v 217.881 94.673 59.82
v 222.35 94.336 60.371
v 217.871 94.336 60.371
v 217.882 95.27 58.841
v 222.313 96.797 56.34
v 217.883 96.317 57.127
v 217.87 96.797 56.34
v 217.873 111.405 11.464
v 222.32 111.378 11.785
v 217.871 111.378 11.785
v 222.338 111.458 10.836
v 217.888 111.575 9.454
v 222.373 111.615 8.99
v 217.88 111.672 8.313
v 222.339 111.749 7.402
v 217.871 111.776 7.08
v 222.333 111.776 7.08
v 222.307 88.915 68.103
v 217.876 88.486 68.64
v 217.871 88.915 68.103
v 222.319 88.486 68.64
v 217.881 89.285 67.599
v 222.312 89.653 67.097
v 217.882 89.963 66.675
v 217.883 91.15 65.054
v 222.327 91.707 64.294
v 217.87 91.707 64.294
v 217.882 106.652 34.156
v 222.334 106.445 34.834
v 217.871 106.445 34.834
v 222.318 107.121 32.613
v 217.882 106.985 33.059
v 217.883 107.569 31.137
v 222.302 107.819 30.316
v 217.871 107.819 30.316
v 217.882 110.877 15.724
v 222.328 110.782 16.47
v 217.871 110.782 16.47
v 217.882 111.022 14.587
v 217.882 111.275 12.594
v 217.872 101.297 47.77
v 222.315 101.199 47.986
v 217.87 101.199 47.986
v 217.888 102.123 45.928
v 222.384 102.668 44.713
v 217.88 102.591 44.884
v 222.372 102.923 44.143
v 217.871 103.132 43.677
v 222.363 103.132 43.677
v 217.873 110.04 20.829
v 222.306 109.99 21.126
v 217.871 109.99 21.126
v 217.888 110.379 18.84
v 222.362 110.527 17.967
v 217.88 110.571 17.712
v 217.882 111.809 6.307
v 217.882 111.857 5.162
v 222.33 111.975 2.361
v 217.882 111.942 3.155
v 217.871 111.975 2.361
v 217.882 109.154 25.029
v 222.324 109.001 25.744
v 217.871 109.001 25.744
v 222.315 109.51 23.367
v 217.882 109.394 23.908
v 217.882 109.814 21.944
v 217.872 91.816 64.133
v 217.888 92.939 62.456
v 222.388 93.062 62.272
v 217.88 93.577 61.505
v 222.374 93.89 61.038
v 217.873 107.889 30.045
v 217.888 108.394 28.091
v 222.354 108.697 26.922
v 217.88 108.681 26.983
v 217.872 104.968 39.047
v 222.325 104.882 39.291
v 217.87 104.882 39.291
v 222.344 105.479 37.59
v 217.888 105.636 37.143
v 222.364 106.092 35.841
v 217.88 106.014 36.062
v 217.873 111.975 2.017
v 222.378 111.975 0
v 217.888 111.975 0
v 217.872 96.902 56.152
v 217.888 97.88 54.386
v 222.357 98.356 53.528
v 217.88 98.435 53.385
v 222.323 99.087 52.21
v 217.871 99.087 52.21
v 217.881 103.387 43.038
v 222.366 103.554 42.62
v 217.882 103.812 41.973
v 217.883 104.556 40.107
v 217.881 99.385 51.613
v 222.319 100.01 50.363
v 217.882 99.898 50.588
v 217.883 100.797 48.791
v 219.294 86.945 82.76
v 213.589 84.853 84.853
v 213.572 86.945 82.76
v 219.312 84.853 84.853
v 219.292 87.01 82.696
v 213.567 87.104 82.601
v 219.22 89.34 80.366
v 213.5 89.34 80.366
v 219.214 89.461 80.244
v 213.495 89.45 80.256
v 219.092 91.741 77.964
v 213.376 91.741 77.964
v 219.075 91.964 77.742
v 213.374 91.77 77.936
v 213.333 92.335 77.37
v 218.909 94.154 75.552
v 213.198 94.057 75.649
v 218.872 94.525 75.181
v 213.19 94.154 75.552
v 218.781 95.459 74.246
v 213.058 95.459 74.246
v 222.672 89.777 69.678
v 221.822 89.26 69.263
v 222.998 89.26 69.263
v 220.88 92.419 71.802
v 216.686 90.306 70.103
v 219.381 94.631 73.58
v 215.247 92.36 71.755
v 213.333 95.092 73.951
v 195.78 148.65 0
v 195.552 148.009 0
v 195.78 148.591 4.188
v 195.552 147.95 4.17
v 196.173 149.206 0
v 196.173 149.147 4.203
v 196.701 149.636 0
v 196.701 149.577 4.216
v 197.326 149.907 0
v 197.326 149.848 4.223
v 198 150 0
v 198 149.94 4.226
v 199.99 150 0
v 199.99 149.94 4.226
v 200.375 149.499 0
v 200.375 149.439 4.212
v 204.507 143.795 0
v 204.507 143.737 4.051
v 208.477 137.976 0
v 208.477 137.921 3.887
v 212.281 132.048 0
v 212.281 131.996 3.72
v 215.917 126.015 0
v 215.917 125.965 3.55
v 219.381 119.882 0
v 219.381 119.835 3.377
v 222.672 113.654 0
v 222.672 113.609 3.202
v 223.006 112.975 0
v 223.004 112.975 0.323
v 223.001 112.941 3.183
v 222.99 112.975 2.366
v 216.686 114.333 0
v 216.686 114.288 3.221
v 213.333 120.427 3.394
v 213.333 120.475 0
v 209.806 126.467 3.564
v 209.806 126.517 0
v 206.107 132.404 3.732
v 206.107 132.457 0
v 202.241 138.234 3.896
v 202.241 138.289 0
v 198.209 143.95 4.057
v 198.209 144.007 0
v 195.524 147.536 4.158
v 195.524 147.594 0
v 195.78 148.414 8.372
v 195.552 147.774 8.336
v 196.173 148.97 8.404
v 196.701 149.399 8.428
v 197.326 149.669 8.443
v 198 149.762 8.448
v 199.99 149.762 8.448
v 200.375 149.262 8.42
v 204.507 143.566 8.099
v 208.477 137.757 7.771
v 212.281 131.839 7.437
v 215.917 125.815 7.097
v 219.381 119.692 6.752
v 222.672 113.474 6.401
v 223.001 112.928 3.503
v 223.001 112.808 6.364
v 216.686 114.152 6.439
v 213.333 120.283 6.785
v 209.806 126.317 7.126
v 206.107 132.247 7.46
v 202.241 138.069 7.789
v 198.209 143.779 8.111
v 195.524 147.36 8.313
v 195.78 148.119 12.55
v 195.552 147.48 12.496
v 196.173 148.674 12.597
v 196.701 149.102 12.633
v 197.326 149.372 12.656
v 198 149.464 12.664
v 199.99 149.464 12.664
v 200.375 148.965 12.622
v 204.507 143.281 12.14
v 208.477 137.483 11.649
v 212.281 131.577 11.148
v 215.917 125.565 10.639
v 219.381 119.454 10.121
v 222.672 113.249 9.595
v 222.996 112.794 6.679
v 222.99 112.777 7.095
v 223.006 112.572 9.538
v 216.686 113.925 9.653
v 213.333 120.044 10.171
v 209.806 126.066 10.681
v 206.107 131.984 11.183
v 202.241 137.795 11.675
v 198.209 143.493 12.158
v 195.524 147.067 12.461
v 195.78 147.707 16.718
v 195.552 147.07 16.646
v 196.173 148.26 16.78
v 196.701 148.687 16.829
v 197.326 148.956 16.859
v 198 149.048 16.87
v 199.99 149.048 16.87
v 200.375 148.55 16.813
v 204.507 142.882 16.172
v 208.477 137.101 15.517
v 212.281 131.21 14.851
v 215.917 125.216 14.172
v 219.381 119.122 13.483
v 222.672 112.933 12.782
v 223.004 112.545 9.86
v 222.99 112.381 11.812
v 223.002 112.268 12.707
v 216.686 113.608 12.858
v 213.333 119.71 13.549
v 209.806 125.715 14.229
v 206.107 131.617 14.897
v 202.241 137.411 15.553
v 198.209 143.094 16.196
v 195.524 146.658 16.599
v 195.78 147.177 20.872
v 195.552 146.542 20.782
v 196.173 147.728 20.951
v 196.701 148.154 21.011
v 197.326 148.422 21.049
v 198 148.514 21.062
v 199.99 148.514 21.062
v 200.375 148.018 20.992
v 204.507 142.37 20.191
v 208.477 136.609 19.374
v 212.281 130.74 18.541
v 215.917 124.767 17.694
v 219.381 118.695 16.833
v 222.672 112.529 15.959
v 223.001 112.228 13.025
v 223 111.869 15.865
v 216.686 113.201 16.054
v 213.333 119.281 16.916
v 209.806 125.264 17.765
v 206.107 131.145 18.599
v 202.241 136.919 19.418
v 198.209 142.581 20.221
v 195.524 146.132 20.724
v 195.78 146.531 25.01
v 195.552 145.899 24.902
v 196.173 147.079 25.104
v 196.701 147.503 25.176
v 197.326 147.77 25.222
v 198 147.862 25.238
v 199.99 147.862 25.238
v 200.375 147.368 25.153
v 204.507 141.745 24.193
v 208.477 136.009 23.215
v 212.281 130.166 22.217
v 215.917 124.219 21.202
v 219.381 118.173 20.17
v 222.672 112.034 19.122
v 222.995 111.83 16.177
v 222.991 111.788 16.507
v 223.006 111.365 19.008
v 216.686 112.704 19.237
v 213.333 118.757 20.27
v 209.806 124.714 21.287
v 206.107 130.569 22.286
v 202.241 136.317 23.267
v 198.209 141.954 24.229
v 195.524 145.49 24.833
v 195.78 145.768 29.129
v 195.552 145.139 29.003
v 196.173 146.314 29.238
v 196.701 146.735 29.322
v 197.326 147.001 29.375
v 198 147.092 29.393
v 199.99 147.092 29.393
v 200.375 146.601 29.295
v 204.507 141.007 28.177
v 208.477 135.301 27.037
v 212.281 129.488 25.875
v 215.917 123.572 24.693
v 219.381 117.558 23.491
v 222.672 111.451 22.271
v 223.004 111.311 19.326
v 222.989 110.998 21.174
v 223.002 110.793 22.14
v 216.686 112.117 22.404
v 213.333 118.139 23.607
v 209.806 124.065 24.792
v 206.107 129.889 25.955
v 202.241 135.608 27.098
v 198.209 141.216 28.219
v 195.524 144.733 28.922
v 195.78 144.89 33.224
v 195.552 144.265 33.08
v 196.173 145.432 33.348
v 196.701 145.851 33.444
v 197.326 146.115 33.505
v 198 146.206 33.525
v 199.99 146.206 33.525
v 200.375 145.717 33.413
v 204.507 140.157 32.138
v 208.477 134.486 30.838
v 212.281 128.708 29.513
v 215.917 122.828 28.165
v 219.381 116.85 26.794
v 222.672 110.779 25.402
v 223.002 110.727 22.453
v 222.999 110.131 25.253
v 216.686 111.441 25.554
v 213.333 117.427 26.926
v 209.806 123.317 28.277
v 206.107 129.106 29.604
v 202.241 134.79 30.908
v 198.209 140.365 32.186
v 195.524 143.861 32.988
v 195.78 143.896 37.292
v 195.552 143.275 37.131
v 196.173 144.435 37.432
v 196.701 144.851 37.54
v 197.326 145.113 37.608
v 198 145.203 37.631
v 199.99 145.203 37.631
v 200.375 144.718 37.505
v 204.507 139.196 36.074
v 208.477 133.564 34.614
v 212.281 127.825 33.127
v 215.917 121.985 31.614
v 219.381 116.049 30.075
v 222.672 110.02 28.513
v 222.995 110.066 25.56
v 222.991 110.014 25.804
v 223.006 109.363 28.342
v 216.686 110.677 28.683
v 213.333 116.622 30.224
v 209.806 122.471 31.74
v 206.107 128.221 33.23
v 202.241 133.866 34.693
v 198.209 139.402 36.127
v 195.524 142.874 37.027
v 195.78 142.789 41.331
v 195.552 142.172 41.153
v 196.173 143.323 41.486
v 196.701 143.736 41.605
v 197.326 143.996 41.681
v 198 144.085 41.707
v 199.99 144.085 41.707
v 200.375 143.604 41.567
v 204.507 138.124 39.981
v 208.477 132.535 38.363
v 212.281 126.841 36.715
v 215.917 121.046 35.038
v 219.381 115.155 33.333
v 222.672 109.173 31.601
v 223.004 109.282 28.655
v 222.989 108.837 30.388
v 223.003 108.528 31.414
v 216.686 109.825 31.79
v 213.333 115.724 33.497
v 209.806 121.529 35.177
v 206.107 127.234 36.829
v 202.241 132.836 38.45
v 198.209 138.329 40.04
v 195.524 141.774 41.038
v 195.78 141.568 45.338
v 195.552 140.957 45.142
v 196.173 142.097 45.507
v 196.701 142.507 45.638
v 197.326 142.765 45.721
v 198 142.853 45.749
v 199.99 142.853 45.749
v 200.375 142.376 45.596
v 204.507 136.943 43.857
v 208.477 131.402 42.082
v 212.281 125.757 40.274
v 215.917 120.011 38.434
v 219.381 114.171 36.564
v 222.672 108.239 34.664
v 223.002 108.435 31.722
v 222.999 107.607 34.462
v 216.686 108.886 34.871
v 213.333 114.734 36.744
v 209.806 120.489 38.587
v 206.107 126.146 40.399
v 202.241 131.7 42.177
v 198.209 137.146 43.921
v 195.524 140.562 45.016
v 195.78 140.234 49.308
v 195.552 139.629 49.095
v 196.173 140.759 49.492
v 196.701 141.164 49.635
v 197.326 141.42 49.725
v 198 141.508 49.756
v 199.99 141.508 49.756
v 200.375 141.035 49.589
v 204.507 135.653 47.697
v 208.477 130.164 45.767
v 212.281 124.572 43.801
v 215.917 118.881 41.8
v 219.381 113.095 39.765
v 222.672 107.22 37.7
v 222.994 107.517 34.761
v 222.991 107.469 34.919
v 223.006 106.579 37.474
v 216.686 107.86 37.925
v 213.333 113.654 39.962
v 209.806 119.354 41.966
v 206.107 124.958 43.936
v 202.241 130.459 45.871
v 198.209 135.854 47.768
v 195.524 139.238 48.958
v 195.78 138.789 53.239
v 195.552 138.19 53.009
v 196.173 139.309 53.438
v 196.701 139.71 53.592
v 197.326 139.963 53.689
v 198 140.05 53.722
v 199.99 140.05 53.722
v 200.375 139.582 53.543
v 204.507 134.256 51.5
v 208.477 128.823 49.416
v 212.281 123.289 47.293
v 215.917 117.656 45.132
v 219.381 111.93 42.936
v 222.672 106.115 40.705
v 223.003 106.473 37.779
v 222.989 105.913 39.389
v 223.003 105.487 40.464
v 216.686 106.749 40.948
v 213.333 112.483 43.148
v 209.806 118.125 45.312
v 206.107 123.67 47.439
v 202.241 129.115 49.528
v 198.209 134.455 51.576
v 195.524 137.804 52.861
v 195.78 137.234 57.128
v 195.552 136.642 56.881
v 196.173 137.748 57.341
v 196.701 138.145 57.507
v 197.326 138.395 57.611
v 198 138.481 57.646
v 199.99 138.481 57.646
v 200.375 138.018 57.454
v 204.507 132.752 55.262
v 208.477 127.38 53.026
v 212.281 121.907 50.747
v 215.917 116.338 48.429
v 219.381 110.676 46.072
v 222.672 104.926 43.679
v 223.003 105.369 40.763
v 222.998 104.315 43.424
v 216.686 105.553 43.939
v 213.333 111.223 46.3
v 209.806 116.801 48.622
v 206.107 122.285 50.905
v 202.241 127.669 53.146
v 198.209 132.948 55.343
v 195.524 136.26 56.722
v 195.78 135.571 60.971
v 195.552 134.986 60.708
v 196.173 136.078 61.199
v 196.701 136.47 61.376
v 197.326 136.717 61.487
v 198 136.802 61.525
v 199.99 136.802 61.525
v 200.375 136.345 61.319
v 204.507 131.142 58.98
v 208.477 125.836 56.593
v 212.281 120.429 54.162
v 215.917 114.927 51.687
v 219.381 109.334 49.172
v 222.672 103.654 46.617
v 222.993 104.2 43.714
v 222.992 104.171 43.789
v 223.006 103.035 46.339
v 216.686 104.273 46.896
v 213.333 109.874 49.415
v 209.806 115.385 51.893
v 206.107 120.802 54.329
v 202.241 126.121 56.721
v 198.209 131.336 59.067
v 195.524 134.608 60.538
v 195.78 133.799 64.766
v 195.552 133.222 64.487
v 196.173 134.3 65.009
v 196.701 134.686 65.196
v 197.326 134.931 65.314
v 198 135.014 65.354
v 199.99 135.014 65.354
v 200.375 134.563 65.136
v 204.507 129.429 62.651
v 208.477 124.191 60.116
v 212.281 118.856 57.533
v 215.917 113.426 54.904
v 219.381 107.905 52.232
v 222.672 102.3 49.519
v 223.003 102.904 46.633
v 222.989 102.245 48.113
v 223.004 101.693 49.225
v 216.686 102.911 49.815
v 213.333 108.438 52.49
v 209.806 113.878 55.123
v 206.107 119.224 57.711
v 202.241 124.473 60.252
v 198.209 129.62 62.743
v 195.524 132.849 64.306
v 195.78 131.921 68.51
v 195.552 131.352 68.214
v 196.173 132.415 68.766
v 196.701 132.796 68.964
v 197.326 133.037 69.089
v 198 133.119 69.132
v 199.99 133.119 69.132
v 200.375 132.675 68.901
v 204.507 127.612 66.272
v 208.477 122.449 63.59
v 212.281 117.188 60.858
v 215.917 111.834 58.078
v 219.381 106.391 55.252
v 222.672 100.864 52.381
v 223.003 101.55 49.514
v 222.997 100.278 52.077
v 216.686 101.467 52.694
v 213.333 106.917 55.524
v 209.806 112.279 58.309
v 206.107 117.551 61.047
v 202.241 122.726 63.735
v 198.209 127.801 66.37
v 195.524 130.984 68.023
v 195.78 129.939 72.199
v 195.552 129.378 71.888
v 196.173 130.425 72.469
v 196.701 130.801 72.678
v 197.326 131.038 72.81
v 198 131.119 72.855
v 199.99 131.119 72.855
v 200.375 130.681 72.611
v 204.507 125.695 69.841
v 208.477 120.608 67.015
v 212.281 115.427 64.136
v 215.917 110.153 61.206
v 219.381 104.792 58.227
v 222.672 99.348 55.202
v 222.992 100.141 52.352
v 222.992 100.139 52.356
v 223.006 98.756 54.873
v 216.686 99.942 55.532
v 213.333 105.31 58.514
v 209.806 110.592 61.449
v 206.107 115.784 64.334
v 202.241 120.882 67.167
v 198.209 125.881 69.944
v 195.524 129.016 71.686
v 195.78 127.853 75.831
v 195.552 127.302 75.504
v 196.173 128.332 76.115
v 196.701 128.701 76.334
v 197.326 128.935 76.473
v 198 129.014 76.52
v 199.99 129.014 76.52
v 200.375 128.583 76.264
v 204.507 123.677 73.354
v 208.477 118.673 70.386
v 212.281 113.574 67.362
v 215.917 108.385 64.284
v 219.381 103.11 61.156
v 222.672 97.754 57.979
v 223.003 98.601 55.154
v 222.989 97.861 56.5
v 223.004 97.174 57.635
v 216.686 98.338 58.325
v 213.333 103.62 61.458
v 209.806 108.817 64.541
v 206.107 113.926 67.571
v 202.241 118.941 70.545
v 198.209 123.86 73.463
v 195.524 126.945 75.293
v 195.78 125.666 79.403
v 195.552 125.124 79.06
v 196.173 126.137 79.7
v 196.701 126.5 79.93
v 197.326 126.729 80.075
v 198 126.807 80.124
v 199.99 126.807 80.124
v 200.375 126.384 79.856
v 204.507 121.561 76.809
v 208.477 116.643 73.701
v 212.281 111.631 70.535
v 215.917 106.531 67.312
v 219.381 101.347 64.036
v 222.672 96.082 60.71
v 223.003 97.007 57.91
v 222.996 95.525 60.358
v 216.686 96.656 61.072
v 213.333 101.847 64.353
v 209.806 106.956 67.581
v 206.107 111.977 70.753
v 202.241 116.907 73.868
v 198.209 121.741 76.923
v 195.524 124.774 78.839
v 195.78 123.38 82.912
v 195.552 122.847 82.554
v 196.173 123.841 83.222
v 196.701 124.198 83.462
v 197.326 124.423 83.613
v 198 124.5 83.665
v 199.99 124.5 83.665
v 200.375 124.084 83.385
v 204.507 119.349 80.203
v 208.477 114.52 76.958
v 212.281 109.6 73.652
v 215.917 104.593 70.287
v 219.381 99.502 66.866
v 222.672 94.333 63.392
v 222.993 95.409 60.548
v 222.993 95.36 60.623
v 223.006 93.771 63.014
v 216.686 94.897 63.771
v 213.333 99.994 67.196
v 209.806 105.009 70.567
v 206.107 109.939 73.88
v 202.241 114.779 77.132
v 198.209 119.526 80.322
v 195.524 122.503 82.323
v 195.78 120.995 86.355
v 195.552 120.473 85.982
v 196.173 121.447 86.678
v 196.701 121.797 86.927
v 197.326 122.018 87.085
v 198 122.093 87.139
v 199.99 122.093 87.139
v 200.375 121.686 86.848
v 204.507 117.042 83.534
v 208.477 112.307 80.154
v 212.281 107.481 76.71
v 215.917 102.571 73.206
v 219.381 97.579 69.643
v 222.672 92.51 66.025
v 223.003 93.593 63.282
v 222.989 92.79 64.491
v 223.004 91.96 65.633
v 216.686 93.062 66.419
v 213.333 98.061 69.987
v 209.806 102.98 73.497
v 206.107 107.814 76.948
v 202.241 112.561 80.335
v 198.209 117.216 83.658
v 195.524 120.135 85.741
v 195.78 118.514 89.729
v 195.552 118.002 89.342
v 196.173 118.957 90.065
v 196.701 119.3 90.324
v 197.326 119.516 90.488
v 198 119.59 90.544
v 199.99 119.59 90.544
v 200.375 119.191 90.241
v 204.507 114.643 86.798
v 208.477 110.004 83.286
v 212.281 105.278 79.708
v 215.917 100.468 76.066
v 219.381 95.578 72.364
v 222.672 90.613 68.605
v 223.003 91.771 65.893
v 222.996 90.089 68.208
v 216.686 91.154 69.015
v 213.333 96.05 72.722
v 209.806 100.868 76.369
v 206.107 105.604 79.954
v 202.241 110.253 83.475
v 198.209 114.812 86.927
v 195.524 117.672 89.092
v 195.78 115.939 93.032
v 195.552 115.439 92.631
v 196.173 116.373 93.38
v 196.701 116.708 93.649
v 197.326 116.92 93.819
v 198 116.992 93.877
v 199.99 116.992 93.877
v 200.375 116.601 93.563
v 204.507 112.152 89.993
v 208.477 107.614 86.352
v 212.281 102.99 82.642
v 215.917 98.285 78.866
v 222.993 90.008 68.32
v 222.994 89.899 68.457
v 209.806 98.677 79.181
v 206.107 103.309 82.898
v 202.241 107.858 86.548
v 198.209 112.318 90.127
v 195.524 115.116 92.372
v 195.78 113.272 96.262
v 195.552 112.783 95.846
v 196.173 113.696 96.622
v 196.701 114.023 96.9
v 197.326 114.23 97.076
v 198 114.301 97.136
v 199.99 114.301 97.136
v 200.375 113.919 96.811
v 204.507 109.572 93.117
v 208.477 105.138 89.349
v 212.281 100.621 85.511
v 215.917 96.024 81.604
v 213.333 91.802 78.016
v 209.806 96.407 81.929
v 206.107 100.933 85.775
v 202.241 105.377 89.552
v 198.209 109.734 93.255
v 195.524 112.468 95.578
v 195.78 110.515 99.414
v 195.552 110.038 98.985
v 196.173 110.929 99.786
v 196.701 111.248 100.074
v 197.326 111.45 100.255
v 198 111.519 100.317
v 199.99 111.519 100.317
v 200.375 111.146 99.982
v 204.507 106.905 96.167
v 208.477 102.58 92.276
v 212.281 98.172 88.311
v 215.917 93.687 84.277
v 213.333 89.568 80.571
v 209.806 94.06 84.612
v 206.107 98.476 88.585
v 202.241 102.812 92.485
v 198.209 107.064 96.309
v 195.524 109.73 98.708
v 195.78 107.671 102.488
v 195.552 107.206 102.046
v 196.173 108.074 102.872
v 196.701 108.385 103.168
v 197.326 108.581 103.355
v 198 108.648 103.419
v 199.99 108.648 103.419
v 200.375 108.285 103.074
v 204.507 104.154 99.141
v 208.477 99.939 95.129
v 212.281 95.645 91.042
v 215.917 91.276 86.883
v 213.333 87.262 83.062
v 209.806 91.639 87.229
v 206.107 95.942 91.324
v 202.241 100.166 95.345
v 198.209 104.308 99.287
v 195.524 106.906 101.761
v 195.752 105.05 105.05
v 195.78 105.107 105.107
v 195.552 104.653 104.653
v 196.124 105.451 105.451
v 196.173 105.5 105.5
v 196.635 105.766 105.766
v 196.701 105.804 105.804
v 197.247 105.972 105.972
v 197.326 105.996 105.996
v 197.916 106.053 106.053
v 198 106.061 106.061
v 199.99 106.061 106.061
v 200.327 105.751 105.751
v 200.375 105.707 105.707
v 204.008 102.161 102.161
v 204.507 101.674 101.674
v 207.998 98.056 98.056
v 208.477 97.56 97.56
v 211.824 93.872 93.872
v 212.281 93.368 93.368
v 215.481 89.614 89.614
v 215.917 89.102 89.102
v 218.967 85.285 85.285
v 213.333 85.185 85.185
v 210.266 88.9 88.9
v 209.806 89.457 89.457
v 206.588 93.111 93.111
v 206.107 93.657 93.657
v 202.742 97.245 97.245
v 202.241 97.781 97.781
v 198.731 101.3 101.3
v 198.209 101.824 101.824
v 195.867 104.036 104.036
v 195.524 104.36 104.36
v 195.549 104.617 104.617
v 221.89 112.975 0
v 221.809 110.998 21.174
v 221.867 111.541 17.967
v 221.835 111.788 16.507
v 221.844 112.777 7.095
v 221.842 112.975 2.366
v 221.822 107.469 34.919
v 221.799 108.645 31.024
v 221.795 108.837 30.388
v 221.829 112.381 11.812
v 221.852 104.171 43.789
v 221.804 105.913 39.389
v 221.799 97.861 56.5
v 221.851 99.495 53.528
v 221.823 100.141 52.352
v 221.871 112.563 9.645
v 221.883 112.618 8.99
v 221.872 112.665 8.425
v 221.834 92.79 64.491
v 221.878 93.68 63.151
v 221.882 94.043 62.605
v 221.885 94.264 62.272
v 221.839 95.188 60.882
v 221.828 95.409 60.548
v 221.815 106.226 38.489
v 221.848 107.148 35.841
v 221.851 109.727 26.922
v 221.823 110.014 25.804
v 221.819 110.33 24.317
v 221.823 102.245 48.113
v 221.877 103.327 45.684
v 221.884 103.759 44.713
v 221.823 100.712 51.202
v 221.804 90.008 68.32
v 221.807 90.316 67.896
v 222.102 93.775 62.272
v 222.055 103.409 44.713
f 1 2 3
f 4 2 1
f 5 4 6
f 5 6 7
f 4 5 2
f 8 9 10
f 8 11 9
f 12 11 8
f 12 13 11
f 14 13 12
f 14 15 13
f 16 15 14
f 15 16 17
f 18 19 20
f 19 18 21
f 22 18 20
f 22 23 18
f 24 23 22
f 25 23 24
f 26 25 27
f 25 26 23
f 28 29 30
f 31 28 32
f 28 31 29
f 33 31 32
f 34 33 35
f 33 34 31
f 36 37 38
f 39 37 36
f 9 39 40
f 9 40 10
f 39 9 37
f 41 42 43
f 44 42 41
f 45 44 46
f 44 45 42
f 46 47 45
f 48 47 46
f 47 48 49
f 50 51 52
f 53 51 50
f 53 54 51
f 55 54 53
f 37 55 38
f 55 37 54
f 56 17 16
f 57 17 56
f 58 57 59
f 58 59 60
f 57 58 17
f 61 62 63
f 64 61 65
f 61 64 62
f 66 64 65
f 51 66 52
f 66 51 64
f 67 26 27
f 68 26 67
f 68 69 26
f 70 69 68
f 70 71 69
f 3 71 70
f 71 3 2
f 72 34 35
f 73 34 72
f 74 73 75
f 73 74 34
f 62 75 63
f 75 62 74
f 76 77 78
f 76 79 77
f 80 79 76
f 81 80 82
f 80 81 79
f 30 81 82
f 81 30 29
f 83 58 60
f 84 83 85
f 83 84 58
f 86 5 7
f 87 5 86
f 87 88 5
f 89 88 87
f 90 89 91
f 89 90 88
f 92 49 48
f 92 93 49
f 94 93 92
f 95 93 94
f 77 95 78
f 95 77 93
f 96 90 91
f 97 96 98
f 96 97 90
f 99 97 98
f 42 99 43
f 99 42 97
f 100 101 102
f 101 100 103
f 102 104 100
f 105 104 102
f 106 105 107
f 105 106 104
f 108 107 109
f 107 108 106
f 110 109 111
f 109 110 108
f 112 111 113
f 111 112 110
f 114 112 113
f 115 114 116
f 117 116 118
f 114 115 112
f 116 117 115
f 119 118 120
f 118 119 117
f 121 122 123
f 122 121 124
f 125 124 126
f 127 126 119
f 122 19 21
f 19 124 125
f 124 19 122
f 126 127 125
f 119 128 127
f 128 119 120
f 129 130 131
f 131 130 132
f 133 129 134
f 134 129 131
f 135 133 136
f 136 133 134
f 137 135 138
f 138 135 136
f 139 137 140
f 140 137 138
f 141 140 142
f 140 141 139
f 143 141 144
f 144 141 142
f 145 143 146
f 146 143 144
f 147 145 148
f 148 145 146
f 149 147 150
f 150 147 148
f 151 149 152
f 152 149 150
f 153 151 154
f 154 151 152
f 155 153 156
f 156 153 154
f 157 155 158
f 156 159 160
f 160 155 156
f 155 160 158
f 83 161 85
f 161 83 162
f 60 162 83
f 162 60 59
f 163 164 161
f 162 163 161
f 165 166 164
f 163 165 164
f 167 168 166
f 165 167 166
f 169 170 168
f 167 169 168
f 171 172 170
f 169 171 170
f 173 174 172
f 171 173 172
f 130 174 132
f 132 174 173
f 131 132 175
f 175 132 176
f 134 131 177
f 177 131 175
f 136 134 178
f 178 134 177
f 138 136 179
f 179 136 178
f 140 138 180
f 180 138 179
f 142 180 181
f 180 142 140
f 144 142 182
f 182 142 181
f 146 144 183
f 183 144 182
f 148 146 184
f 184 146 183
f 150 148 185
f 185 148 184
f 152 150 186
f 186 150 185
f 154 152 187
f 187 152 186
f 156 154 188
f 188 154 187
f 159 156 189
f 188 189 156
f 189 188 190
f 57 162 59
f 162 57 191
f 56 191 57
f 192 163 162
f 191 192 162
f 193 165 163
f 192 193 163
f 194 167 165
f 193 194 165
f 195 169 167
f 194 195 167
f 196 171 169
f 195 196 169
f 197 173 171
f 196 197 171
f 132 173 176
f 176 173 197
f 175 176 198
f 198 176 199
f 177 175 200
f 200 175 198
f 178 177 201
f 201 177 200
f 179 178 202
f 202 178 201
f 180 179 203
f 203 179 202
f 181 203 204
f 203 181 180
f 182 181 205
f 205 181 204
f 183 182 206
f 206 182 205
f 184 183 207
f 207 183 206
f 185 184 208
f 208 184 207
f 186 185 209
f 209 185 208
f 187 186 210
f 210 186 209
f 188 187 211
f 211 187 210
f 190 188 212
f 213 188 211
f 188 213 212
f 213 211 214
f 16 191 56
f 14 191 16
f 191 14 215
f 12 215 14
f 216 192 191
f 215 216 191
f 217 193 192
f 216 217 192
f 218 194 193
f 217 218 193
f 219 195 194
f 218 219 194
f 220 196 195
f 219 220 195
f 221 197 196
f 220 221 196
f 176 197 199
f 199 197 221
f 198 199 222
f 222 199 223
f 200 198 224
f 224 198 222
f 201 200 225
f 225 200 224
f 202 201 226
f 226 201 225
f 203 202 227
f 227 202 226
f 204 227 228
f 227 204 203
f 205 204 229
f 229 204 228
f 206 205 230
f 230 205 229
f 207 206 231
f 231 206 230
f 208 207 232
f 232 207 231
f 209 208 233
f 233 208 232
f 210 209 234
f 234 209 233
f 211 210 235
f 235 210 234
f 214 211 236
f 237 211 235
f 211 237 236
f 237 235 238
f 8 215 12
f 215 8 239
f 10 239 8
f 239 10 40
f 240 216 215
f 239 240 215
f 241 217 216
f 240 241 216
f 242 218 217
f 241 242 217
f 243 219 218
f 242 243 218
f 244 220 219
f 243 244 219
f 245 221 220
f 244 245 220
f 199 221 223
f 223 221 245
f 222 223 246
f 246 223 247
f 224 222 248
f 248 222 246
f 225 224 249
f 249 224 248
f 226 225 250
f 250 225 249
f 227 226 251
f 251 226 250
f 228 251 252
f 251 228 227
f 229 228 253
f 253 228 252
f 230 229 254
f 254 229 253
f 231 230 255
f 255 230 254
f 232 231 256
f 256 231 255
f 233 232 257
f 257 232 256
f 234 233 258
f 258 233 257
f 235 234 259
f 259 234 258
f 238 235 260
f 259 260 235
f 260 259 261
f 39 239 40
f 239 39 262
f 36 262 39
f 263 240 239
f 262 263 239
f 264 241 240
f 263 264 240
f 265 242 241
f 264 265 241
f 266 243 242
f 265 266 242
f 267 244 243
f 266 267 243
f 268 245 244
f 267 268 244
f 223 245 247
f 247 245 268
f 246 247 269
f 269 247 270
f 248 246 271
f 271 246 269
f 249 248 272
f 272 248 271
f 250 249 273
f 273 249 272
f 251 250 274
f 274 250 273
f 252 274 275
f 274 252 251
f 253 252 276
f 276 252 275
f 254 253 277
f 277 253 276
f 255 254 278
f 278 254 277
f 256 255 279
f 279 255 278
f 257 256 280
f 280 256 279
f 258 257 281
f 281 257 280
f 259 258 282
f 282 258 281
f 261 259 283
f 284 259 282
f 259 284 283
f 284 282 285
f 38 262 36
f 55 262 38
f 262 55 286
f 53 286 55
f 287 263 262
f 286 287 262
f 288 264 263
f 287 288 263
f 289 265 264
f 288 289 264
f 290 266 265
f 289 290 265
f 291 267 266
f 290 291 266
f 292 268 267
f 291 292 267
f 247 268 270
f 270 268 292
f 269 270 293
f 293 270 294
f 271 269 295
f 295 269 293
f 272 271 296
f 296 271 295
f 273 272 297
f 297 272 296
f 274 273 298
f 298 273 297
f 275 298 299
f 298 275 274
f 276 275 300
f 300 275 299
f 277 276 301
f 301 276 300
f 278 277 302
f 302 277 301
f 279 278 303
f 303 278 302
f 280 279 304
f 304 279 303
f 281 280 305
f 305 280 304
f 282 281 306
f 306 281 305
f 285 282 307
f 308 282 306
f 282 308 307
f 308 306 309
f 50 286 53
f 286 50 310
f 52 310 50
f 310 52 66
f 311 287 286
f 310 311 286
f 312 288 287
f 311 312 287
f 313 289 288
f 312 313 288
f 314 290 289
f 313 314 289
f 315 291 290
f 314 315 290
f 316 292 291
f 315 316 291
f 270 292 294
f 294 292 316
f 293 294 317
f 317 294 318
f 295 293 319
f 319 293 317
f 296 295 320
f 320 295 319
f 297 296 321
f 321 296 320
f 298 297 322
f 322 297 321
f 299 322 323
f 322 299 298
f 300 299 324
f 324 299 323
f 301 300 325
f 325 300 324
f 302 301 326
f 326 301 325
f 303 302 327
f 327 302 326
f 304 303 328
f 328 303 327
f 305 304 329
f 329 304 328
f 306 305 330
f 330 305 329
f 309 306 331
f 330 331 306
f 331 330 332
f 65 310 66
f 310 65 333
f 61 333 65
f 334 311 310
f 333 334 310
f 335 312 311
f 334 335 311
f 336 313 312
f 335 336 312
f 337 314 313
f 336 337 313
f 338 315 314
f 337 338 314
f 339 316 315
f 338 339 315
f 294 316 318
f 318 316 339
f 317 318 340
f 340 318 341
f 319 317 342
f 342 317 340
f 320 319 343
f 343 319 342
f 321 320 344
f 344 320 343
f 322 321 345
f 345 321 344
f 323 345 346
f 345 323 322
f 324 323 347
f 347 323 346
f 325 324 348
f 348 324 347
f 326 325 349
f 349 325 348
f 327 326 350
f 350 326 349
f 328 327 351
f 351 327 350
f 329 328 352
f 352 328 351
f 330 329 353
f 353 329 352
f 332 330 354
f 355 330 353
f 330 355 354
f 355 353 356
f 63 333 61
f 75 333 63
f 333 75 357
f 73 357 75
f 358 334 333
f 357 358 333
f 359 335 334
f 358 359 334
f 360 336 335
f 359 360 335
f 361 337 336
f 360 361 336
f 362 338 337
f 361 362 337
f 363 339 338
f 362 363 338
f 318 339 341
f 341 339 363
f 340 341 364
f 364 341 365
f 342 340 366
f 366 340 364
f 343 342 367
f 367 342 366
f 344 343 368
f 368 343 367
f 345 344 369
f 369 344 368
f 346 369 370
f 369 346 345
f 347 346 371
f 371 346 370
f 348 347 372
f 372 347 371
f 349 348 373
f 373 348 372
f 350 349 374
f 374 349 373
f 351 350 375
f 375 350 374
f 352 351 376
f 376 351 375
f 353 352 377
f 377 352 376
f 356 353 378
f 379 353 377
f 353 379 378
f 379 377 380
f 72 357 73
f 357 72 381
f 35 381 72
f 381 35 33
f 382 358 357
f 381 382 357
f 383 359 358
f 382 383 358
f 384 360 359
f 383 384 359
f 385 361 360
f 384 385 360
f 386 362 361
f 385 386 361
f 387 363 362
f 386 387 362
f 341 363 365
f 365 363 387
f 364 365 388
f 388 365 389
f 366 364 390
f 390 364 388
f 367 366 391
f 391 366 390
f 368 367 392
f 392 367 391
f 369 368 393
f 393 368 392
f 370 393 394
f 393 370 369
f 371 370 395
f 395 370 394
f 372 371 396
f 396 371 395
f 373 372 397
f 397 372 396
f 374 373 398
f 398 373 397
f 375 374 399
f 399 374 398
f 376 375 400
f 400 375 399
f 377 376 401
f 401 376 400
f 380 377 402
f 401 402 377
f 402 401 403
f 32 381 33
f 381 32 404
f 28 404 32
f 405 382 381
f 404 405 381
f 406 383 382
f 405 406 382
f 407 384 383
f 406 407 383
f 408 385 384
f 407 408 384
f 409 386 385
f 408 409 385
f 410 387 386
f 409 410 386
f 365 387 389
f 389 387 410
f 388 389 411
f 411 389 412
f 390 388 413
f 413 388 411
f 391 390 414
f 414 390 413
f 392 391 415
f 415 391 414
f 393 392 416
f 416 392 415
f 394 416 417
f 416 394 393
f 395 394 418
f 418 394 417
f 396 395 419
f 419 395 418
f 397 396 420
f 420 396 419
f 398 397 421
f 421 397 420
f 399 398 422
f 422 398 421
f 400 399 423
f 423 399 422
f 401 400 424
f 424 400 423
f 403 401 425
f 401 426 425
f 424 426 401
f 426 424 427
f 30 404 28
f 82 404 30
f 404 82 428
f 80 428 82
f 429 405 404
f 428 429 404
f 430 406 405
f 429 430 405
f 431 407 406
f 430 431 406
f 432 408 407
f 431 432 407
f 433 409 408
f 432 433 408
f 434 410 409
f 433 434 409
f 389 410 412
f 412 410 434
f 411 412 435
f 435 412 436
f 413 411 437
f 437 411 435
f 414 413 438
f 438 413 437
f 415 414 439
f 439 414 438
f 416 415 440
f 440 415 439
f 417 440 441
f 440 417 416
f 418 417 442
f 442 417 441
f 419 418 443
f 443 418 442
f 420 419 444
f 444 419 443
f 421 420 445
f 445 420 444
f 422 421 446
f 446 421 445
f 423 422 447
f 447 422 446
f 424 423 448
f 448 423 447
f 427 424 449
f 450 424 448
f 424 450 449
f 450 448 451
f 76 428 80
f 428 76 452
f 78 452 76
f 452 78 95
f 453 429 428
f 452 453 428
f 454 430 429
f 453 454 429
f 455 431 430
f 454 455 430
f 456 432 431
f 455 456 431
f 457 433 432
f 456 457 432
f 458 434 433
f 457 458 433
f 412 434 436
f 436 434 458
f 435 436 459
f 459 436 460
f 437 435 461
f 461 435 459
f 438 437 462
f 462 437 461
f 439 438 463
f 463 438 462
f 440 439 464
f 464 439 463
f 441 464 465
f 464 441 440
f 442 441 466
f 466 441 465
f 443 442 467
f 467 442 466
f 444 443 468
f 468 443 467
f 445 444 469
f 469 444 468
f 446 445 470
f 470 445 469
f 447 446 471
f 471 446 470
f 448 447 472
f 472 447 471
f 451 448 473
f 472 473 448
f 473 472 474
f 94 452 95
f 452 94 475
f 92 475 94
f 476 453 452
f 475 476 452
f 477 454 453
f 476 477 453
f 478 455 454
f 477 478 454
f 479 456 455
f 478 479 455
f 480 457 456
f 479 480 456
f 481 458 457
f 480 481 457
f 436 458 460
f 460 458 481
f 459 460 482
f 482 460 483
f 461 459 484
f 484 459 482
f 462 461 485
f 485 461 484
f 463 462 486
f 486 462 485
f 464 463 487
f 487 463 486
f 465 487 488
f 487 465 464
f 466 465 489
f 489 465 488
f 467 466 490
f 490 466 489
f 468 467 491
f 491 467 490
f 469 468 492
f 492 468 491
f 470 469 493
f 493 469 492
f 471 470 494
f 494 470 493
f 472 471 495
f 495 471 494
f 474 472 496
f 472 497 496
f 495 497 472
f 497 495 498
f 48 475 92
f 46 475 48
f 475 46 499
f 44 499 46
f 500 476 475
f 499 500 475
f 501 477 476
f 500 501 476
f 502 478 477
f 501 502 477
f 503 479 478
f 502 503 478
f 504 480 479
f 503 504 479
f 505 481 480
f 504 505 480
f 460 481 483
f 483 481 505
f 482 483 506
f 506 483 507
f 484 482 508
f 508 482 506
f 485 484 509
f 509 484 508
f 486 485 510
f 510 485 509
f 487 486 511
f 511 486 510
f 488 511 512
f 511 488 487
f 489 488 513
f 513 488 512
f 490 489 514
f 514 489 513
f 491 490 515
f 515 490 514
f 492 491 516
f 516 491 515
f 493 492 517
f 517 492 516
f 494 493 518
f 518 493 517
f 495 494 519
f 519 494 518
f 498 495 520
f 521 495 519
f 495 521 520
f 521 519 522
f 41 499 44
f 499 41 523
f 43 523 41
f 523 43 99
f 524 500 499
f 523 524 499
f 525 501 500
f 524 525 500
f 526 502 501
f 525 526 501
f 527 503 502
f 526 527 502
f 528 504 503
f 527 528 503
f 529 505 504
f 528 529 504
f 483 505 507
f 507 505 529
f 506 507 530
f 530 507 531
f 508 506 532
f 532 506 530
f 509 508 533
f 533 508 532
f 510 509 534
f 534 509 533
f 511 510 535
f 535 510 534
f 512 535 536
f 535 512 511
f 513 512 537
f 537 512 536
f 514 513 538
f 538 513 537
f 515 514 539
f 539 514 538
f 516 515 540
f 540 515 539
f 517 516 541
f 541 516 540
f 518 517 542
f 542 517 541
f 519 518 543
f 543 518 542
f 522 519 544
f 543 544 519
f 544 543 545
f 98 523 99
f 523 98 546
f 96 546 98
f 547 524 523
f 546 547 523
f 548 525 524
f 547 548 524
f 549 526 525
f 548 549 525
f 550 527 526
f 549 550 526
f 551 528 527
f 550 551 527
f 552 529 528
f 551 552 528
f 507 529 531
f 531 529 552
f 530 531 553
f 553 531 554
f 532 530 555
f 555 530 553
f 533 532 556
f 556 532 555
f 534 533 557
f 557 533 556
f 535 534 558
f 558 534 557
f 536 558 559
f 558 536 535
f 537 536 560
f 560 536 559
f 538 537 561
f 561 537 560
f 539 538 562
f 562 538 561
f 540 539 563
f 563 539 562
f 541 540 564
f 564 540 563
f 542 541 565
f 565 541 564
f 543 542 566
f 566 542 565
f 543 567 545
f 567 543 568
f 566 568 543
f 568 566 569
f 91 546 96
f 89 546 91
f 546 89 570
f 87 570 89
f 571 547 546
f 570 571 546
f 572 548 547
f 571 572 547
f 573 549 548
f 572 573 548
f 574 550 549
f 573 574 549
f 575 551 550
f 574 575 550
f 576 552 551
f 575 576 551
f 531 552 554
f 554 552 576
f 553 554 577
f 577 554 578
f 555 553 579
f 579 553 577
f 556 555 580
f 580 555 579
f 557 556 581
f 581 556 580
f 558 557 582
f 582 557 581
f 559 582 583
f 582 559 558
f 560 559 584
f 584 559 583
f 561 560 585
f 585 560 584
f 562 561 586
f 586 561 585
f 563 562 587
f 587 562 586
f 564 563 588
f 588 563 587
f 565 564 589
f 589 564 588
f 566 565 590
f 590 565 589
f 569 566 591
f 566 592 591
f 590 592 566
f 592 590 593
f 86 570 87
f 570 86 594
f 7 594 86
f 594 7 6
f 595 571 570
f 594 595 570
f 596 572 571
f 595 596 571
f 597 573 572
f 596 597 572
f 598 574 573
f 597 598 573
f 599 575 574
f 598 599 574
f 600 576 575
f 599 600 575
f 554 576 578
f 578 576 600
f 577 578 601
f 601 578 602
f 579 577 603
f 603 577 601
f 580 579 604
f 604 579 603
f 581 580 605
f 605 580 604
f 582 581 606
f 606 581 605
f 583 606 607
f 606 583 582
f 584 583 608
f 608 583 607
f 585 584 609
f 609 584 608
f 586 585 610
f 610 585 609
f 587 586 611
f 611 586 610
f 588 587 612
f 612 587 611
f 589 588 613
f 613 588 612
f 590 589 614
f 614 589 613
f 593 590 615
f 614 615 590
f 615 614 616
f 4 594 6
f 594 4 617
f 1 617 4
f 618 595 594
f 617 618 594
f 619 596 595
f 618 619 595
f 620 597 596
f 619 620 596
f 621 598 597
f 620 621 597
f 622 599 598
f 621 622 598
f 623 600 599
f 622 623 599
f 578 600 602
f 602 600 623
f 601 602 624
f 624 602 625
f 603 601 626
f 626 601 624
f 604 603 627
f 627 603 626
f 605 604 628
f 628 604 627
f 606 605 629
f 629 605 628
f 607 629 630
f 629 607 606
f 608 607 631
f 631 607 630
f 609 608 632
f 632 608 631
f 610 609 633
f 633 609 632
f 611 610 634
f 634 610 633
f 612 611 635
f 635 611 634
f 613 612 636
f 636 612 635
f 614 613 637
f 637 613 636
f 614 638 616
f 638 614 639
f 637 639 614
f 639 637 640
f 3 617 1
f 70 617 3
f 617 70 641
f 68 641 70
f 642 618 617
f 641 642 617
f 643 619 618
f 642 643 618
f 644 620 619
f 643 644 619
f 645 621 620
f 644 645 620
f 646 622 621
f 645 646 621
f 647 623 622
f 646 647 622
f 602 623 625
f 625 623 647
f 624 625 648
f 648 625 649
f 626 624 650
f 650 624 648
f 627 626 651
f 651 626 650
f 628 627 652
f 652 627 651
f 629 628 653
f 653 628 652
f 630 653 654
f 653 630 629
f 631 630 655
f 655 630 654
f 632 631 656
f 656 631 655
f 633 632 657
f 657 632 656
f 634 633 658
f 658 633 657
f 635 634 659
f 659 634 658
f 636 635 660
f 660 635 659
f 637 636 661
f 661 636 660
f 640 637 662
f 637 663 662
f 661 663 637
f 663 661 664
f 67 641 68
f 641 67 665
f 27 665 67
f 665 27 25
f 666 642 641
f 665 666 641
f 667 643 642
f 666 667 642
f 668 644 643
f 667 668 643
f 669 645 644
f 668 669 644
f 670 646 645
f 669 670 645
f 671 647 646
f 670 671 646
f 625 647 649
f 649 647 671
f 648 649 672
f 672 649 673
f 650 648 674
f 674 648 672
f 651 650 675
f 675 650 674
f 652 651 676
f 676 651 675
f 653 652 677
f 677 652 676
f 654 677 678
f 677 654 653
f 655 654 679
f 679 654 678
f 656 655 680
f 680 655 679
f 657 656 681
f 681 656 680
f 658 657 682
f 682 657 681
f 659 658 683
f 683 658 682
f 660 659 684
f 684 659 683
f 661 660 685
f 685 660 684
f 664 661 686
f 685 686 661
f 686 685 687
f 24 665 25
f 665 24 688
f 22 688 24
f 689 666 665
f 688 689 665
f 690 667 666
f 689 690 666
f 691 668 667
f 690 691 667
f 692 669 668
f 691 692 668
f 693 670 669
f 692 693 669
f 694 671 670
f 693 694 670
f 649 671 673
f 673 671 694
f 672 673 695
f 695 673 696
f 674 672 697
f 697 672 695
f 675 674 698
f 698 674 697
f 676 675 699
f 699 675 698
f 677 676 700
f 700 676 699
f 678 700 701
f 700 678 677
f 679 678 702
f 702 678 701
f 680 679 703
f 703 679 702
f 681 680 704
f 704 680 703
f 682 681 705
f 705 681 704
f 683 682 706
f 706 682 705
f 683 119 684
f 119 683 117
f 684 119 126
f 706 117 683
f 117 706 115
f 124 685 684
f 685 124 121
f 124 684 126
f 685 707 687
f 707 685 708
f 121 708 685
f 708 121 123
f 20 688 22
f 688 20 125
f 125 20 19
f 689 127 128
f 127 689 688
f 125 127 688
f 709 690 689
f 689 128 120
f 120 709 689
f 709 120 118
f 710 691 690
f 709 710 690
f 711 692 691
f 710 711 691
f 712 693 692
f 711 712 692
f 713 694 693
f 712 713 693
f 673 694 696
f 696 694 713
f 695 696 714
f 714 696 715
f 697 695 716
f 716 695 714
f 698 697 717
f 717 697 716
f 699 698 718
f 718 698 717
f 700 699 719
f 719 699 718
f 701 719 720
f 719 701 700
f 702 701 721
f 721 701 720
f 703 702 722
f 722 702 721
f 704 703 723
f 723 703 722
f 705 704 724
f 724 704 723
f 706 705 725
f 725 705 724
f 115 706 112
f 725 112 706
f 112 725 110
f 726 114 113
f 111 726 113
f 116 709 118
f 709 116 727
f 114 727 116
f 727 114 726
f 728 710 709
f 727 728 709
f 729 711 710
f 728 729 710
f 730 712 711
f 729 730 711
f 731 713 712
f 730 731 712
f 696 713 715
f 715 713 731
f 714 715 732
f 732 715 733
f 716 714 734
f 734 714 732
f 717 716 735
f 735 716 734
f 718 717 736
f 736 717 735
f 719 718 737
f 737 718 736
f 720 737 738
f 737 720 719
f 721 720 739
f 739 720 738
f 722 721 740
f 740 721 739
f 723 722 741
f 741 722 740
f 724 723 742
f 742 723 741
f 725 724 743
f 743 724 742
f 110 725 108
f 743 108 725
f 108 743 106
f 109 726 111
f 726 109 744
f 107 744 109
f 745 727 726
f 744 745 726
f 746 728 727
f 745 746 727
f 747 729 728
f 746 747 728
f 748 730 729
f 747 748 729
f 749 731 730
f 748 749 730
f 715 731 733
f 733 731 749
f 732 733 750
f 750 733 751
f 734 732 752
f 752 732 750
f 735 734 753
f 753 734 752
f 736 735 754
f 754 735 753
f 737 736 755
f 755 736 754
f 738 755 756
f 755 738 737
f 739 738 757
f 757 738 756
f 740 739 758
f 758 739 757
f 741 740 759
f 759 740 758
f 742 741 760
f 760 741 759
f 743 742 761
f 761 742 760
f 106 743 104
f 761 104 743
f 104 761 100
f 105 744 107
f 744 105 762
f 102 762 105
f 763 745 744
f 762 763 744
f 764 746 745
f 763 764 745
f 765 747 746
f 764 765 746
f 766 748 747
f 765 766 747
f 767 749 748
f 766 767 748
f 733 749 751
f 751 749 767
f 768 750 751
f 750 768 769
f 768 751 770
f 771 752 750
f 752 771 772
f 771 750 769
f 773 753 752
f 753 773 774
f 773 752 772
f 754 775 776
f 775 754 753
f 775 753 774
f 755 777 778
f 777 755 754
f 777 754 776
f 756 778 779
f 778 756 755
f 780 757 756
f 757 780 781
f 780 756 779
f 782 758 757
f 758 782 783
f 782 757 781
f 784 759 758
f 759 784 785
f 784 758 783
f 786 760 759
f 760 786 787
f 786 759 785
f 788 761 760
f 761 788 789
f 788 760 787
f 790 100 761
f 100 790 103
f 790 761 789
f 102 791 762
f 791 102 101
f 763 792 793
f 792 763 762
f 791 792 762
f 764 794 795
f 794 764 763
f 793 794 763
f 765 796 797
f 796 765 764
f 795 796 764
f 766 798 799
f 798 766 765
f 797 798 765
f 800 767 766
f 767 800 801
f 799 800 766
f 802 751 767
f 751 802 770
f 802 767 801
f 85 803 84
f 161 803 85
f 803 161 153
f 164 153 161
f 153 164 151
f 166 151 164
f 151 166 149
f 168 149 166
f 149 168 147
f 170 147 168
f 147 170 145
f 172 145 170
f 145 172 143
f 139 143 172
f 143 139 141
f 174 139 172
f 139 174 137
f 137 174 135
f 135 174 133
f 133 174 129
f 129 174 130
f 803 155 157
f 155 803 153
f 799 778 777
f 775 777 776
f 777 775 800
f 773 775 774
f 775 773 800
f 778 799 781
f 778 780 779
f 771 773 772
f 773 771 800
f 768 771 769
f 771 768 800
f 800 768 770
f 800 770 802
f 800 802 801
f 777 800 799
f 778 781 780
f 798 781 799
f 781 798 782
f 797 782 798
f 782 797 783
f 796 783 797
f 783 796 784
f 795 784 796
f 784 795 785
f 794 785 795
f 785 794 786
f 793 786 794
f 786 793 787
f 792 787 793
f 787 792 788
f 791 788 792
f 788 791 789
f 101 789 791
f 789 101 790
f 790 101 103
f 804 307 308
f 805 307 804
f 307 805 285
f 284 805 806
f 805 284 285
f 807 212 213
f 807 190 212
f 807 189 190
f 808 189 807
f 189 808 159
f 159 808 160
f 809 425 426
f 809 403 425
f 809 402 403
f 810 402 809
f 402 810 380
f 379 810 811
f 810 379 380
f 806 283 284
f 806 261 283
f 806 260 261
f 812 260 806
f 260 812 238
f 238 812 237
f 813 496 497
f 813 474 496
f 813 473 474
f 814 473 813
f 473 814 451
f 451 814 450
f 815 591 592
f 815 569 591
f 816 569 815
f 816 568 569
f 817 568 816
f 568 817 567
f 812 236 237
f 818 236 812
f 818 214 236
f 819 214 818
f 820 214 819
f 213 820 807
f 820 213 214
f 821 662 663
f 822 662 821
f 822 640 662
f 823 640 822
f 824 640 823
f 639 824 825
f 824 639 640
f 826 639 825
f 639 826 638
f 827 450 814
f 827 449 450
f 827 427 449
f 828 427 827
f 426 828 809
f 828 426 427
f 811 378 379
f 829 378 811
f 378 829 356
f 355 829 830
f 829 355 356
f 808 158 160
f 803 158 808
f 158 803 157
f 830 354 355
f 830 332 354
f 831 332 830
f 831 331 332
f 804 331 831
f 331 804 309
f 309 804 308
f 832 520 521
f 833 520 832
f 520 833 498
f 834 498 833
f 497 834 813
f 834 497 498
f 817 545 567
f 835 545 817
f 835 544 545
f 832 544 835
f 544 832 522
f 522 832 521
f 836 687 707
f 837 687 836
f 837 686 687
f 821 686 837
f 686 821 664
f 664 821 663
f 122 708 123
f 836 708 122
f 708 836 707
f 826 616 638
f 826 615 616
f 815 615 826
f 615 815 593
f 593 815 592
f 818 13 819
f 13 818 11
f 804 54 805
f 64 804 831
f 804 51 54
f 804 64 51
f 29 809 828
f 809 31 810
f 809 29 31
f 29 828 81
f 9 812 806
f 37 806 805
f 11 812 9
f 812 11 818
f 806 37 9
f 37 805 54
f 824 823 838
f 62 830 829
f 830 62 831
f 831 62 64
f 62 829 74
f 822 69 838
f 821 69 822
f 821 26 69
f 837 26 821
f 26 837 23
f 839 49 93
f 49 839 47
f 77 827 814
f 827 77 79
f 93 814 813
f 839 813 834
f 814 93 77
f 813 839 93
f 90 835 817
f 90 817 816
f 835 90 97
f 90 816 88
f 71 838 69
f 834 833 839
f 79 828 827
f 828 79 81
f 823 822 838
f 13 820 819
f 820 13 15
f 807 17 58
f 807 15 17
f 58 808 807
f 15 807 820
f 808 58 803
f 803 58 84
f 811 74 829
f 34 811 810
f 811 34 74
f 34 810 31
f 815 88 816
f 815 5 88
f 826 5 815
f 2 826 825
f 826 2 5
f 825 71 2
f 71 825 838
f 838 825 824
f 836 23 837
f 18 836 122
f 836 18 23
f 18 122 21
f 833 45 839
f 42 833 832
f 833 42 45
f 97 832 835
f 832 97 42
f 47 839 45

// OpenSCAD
// file: ../motors/MN5212.scad
use <../utils.scad>

module MN5212(){

	render(){
		translate([0,0, 42.5 / 2 - 23 / 2 - 4.9 - 6])
			cylinder(
				h = 23,
				r = 59 / 2,
				$fa = fa(59 / 2),
				center = true);
		translate([0,0, 42.5 / 2 - 4.9 / 2 - 6])
			cylinder(
				h = 4.9,
				r1 = 59 / 2,
				r2 = 24.8 / 2,
				$fa = fa(59 / 2),
				center = true);
		translate([0,0, - 42.5 / 2 + 5.6 / 2 + 3])
			cylinder(
				h = 5.6,
				r1 = 44 / 2,
				r2 = 59 / 2,
				$fa = fa(59 / 2),
				center = true);
		translate([0, 0, 42.5 / 2 - 3])
			cylinder(
				h = 6,
				r = 4 / 2,
				$fa = fa(4 / 2),
				center = true);
		translate([0, 0, - 42.5 / 2 + 1.5])
			cylinder(
				h = 3,
				r = 6 / 2,
				$fa = fa(6 / 2),
				center = true);
	}

}
// file: ../servos/TGY_4805_2PA.scad
use <../utils.scad>

module TGY_4805_2PA(){

	length = 40;
	width = 20;
	depth = 38.7;
	wing_width = 58;
	wing_thick = 4;
	shaft_offset = 6;
	hole_spacing = 50;
	shaft_height = 42;
	shaft_length = 2;

	module mounting_hole(){
		mh_rad = 2 / 2;
		translate(
			[
				hole_spacing / 2,
				0,
				depth / 2 - wing_thick / 2
			])
			cylinder(h = 5, r = mh_rad, $fa = fa(mh_rad), center = true);
	}

	difference(){
		union(){
			cube([length, width, depth], center = true);
			translate([0, 0, depth / 2 - wing_thick / 2])
				cube([wing_width, width, wing_thick], center = true);
			translate(
				[
					- length / 2 + shaft_offset,
					0,
					shaft_height - length / 2 + shaft_length / 2
				])
				cylinder(
					h = shaft_length,
					r = 1.5,
					$fa = fa(1.5),
					center = true);
		}	union(){

			mounting_hole();
			mirror() mounting_hole();
		}
	}
}

TGY_4805_2PA();
// file: ../servos/HS_5065MG.scad
use <../utils.scad>

module HS_5065MG(){

	length = 23.75;
	width = 11.68;
	depth = 20.32;
	wing_width = 32.38;
	wing_thick = 3.43;
	shaft_offset = 6;
	hole_spacing = 28.32;
	shaft_height = 26.16;
	shaft_length = 2;

	module mounting_hole(){
		mh_rad = 2 / 2;
		translate(
			[
				hole_spacing / 2,
				0,
				depth / 2 - wing_thick / 2
			])
			cylinder(h = 5, r = mh_rad, $fa = fa(mh_rad), center = true);
	}

	difference(){
		union(){
			cube([length, width, depth], center = true);
			translate([0, 0, depth / 2 - wing_thick / 2])
				cube([wing_width, width, wing_thick], center = true);
			translate(
				[
					- length / 2 + shaft_offset,
					0,
					shaft_height - length / 2 + shaft_length / 2
				])
				cylinder(
					h = shaft_length,
					r = 1.5,
					$fa = fa(1.5),
					center = true);
		}	union(){

			mounting_hole();
			mirror() mounting_hole();
		}
	}
}

HS_5065MG();
// file: ../servos/LS_0006_servo.scad
// Author Michael Marques (DrYerzinia)

use <../utils.scad>

module ls_0006_servo(){
	
	length = 21.4;
	depth = 19.9;
	thickness = 11.65;

	gear_height = 2.6;
	gear_bump_height = 0.7;
	gear_bump_diameter = 1.97;
	gear_outer_bump_diameter = 6;
	gear_bump_offset = 12.2;

	shaft_height = 2.4;
	shaft_diameter = 3.74;
	shaft_offset = thickness / 2;
	shaft_screw_diameter = 1.3;
	
	wing_outer_width = 8.5;
	wing_top_off = 3.8;
	wing_length = 3.8;
	wing_thickness = 1.2;
	wing_hole_diameter = 1.85;
	wing_hole_edge_dist = 2;

	module wing_hole(){
		translate(
			[
				length / 2 + wing_hole_edge_dist,
				0,
				depth/2 - wing_top_off - wing_thickness / 2
			])
			cylinder(
				h = wing_thickness + 1,
				r = wing_hole_diameter / 2,
				$fn = 16,
				center = true);
	}

	module wing(){
		translate(
			[
				length / 2,
				thickness / 2,
				depth/2 - wing_top_off - wing_thickness
			])
			rotate([0,0,-90])
				trapezoid(
					thickness,
					wing_outer_width,
					wing_length,
					wing_thickness);
	}

	// Body
	cube([length, thickness, depth], center = true);

	difference(){
		union(){

			wing();
			mirror() wing();

			// Gear Bumps
			translate([0, 0, depth/2 + gear_height / 2]){
				translate([length / 2 - gear_bump_offset, 0, 0])
					cylinder(
						h = gear_height,
						r = gear_outer_bump_diameter / 2,
						$fn = 16,
						center = true);
				translate([length / 2 - gear_bump_offset, 0, gear_height/2 + gear_bump_height / 2])
					cylinder(
						h = gear_bump_height,
						r = gear_bump_diameter / 2,
						$fn = 16,
						center = true);
				translate([length / 2 - shaft_offset, 0, 0])
					cylinder(
						h = gear_height,
						r = thickness / 2,
						$fn = 32,
						center = true);
				// Shaft
				translate([length / 2 - shaft_offset, 0, gear_height])
					cylinder(
						h = shaft_height,
						r = shaft_diameter / 2,
						$fn = 16,
						center = true);
			}

		}
		union(){

			wing_hole();
			mirror() wing_hole();

			// Shaft_hole
			translate(
				[
					length / 2 - shaft_offset,
					0,
					depth/2 + gear_height * (3 / 2) + 0.5])
				cylinder(
					h = shaft_height + 1,
					r = shaft_screw_diameter / 2,
					$fn = 16,
					center = true);

		}
	}

}

module translate_ls_0006_attachment(){

	length = 21.4;
	thickness = 11.65;
	shaft_offset = thickness / 2;
	depth = 19.9;
	float = 3.3;

	translate([length / 2 - shaft_offset, 0, depth / 2 + float])
		children();

}

module bar_attachment(){

	height = 3.75;
	bar_length = 14.7;
	bar_thickness = 1.6;
	inner_radius = 5.9;
	outer_radius = 3.95;
	shaft_diameter = 3.7;
	upper_void_diameter = 4.8;
	screw_diameter = 2;
	hole_spacing = 2;
	hole_4_diameter = 1.2;
	hole_diameter = 1;
	hole_start_off = 4.7;
	top_void_depth = 0.67;
	bottom_void_depth = 1.84;

	translate([0, 0, height / 2]){
		difference(){
			union(){

				translate([0, inner_radius / 2, height / 2 - bar_thickness])
					rotate([0,0,-90])
						trapezoid(
							inner_radius,
							outer_radius,
							bar_length,
							bar_thickness);

				cylinder(
					h = height,
					r = inner_radius / 2,
					$fn = 16,
					center = true);

				translate([bar_length, 0, height / 2 - bar_thickness / 2])
					cylinder(
						h = bar_thickness,
						r = outer_radius / 2,
						$fn = 16,
						center = true);

			}
			union(){
				// screwhole
				cylinder(
					h = height + 1,
					r = screw_diameter / 2,
					$fn = 16,
					center = true);
				// voids
				translate([0, 0, height / 2 - top_void_depth / 2 + 0.5])
					cylinder(
						h = top_void_depth + 1,
						r = upper_void_diameter / 2,
						$fn = 16,
						center = true);
				translate([0, 0,  - bottom_void_depth / 2 - 0.5])
					cylinder(
						h = bottom_void_depth + 1,
						r = shaft_diameter / 2,
						$fn = 16,
						center = true);

				for(i = [0:4]){
					dia = (i != 3) ? hole_diameter : hole_4_diameter;
					translate(
						[
							hole_start_off + hole_spacing * i,
							0,
							height / 2 - bar_thickness / 2])
						cylinder(
							h = bar_thickness + 1,
							r = dia / 2,
							$fn = 16,
							center = true);
				}

			}
		}
	}

}

ls_0006_servo();
translate_ls_0006_attachment() bar_attachment();
// file: ../servos/parallax_continuous_rotation_servo.scad
// Author Michael Marques (DrYerzinia)

module parallax_continuous_rotation_servo(){

	depth = 37.7;
	length = 40.75;
	width = 19.75;

	mount_height = 2.7;
	mount_extent = 6.1;
	mount_from_top = 7.7;

	mount_hole_diameter = 4.46;
	mount_hole_spacing = 14.4 - mount_hole_diameter;

	shaft_diameter = 5.8;
	shaft_offset = 10;
	shaft_length = 3.5;

	module mounting_hole(){

			translate(
				[
					length / 2 + 5,
					mount_hole_spacing / 2,
					depth / 2 - mount_height / 2 - mount_from_top
				]
				)
				cylinder(
					h = mount_height + 1,
					r = mount_hole_diameter / 2,
					$fn=16,
					center = true);
	}

	difference(){
		union(){

			// Body
			cube([length,width,depth], center = true);

			// Mounting wings
			translate(
				[
					0,
					0,
					depth / 2 - mount_height / 2 - mount_from_top
				])
				cube(
					[
						length + mount_extent * 2,
						width,
						mount_height
					],
					center = true);

			// Shaft
			translate(
				[
					length / 2 - shaft_offset,
					0,
					depth / 2 + shaft_length / 2
				]
				)
				cylinder(
					h = shaft_length,
					r = shaft_diameter / 2,
					$fn = 16,
					center = true
				);

		}
		union(){

			// Mounting Holes
			mounting_hole();
			mirror()
				mounting_hole();

			translate([0,-mount_hole_spacing,0]){
				mounting_hole();
				mirror()
					mounting_hole();
			}
		}
	}

}

module translate_shaft(){

	depth = 37.7;
	length = 40.75;

	shaft_offset = 10;

	translate(
		[
			length / 2 - shaft_offset,
			0,
			depth / 2
		])
		children();
}

module round_servo_attachment(){

	height = 6;
	diameter = 20.8;
	inner_diameter = 8.6;
	plate_thickness = 2.45;

	float = 2;

	depth = 37.7;
	length = 40.75;

	shaft_offset = 10;

	plate_hole_spacing = 14.5;
	plate_hole_diameter = 1.4;
	plate_hole_minor_spacing = 3.5;

	screw_hole_diameter = 3;

	inner_diameter = 8;
	
	top_depth = 1.8;
	bottom_depth = 3.4;

	void_diameter = 5.8;

	module plate_hole(){
		cylinder(
			h = plate_thickness + 1,
			r = plate_hole_diameter / 2,
			$fn = 16,
			center = true
		);
	}

	module plate_hole_group(){
		translate([0, 0, height / 2 - plate_thickness / 2]){
			translate([0, plate_hole_spacing / 2, 0]){
					plate_hole();
					translate([- plate_hole_minor_spacing, 0, 0])
						plate_hole();
					translate([  plate_hole_minor_spacing, 0, 0])
						plate_hole();
			}
		}
	}

	translate(
		[
			length / 2 - shaft_offset,
			0,
			depth / 2 + height / 2 + float
		]
		)
		difference(){

			union(){

				// inner shaft
				cylinder(
					h = height,
					r = inner_diameter / 2,
					$fn = 16,
					center = true
				);

				// top
				translate([0, 0, height / 2 - plate_thickness / 2])
					cylinder(
						h = plate_thickness,
						r = diameter / 2,
						$fn = 32,
						center = true
					);
			}

			union(){

				// plate holes
				for(ang = [0:3]){
					rotate([0,0, ang * 90])
						plate_hole_group();
				}

				// screw hole
				cylinder(
					h = height + 1,
					r = screw_hole_diameter / 2,
					$fn = 16,
					center = true
				);

				// inner voids
				translate([0, 0, height / 2 - top_depth / 2 + 1])
					cylinder(
						h = top_depth + 1,
						r = void_diameter / 2,
						$fn = 16,
						center = true
					);
				translate([0, 0, -1])
					cylinder(
						h = bottom_depth + 1,
						r = void_diameter / 2,
						$fn = 16,
						center = true
					);

			}

		}

}

parallax_continuous_rotation_servo();
round_servo_attachment();
// file: ../hardware.scad
 // Author Michael Marques (DrYerzinia)

// http://www.ebay.com/itm/10-PCS-683-3x7x2-mm-Metal-OPEN-PRECISION-Miniature-Ball-Bearing-3-7-2-/291206307942?hash=item43cd3fa066:m:mCi6eovrGVk_CjIUjlhw8yg
// E-Bay empire.rc

module washer_M3_7x3_2x0_5mm(){

	difference(){
		cylinder(
			h = 0.5,
			r = 7 / 2,
			$fn = 16,
			center = true);
		cylinder(
			h = 0.5 + 0.1,
			r = 3.2 / 2,
			$fn = 16,
			center = true);
	}

}

module bearing_3x7x2mm(){

	difference(){
		cylinder(
			h = 2,
			r = 7 / 2,
			$fn = 16,
			center = true);
		cylinder(
			h = 2 + 1,
			r = 3 / 2,
			$fn = 16,
			center = true);
	}

}

module bearing_5x8x2_5mm(){

	difference(){
		cylinder(
			h = 2.5,
			r = 8 / 2,
			$fn = 16,
			center = true);
		cylinder(
			h = 2.5 + 1,
			r = 5 / 2,
			$fn = 16,
			center = true);
	}

}

module bearing_8x16x5mm(){

	difference(){
		cylinder(
			h = 5,
			r = 16 / 2,
			$fn = 16,
			center = true);
		cylinder(
			h = 5 + 1,
			r = 8 / 2,
			$fn = 16,
			center = true);
	}

}


bearing_5x8x2_5mm();
// file: ../utils.scad
// http://forum.openscad.org/Creating-pie-pizza-slice-shape-need-a-dynamic-length-array-td3148.html

module pie_slice(r, start_angle, end_angle) {
    R = r * sqrt(2) + 1;
    a0 = (4 * start_angle + 0 * end_angle) / 4;
    a1 = (3 * start_angle + 1 * end_angle) / 4;
    a2 = (2 * start_angle + 2 * end_angle) / 4;
    a3 = (1 * start_angle + 3 * end_angle) / 4;
    a4 = (0 * start_angle + 4 * end_angle) / 4;
    if(end_angle > start_angle)
        intersection() {
        circle(r, $fa = fa(r));
        polygon([
            [0,0],
            [R * cos(a0), R * sin(a0)],
            [R * cos(a1), R * sin(a1)],
            [R * cos(a2), R * sin(a2)],
            [R * cos(a3), R * sin(a3)],
            [R * cos(a4), R * sin(a4)],
            [0,0]
       ]);
    }
}

// https://github.com/openscad/openscad/issues/29

module rotate_about(v,a) {
	translate(v) rotate(a) translate(-v) children();
}

module rotate_about_axis(v, ang, axis) {
	translate(v) rotate(ang, axis) translate(-v) children();
}

// https://github.com/robofun/openscad-utils/blob/master/trapezoid.scad

module trapezoid(width_base, width_top, height, thickness){

  linear_extrude(height = thickness)
			polygon(
				points =
					[
						[0,0],
						[width_base,0],
						[width_base-(width_base-width_top)/2,height],
						[(width_base-width_top)/2,height]
					],
					paths=[[0,1,2,3]]); 
  
}

// http://forum.openscad.org/fe-Tolerance-based-arc-approximation-td14212.html

function fa(r)=($fn>0)?360/$fn:($fe>0)?($fe<r)?min(45,2*acos(1-$fe/r)):45:$fa; 
// file: ../render_settings.scad
// Author Michael Marques (DrYerzinia)

// Lulzbot Mini tolerances
// x/y 0.1mm
// z   0.05mm
//
// 0.1mm   preview tolerance
// 0.025mm export  tolerance

$fs = 0.01;
$fn = undef;
$fa = 360 / 5;

$fe = 0.025;	// export
// main file
// Author Michael Marques (DrYerzinia)

include <../render_settings.scad>

use <../BB8.scad>

rotate([180, 0, 0])
	Door_P33();
